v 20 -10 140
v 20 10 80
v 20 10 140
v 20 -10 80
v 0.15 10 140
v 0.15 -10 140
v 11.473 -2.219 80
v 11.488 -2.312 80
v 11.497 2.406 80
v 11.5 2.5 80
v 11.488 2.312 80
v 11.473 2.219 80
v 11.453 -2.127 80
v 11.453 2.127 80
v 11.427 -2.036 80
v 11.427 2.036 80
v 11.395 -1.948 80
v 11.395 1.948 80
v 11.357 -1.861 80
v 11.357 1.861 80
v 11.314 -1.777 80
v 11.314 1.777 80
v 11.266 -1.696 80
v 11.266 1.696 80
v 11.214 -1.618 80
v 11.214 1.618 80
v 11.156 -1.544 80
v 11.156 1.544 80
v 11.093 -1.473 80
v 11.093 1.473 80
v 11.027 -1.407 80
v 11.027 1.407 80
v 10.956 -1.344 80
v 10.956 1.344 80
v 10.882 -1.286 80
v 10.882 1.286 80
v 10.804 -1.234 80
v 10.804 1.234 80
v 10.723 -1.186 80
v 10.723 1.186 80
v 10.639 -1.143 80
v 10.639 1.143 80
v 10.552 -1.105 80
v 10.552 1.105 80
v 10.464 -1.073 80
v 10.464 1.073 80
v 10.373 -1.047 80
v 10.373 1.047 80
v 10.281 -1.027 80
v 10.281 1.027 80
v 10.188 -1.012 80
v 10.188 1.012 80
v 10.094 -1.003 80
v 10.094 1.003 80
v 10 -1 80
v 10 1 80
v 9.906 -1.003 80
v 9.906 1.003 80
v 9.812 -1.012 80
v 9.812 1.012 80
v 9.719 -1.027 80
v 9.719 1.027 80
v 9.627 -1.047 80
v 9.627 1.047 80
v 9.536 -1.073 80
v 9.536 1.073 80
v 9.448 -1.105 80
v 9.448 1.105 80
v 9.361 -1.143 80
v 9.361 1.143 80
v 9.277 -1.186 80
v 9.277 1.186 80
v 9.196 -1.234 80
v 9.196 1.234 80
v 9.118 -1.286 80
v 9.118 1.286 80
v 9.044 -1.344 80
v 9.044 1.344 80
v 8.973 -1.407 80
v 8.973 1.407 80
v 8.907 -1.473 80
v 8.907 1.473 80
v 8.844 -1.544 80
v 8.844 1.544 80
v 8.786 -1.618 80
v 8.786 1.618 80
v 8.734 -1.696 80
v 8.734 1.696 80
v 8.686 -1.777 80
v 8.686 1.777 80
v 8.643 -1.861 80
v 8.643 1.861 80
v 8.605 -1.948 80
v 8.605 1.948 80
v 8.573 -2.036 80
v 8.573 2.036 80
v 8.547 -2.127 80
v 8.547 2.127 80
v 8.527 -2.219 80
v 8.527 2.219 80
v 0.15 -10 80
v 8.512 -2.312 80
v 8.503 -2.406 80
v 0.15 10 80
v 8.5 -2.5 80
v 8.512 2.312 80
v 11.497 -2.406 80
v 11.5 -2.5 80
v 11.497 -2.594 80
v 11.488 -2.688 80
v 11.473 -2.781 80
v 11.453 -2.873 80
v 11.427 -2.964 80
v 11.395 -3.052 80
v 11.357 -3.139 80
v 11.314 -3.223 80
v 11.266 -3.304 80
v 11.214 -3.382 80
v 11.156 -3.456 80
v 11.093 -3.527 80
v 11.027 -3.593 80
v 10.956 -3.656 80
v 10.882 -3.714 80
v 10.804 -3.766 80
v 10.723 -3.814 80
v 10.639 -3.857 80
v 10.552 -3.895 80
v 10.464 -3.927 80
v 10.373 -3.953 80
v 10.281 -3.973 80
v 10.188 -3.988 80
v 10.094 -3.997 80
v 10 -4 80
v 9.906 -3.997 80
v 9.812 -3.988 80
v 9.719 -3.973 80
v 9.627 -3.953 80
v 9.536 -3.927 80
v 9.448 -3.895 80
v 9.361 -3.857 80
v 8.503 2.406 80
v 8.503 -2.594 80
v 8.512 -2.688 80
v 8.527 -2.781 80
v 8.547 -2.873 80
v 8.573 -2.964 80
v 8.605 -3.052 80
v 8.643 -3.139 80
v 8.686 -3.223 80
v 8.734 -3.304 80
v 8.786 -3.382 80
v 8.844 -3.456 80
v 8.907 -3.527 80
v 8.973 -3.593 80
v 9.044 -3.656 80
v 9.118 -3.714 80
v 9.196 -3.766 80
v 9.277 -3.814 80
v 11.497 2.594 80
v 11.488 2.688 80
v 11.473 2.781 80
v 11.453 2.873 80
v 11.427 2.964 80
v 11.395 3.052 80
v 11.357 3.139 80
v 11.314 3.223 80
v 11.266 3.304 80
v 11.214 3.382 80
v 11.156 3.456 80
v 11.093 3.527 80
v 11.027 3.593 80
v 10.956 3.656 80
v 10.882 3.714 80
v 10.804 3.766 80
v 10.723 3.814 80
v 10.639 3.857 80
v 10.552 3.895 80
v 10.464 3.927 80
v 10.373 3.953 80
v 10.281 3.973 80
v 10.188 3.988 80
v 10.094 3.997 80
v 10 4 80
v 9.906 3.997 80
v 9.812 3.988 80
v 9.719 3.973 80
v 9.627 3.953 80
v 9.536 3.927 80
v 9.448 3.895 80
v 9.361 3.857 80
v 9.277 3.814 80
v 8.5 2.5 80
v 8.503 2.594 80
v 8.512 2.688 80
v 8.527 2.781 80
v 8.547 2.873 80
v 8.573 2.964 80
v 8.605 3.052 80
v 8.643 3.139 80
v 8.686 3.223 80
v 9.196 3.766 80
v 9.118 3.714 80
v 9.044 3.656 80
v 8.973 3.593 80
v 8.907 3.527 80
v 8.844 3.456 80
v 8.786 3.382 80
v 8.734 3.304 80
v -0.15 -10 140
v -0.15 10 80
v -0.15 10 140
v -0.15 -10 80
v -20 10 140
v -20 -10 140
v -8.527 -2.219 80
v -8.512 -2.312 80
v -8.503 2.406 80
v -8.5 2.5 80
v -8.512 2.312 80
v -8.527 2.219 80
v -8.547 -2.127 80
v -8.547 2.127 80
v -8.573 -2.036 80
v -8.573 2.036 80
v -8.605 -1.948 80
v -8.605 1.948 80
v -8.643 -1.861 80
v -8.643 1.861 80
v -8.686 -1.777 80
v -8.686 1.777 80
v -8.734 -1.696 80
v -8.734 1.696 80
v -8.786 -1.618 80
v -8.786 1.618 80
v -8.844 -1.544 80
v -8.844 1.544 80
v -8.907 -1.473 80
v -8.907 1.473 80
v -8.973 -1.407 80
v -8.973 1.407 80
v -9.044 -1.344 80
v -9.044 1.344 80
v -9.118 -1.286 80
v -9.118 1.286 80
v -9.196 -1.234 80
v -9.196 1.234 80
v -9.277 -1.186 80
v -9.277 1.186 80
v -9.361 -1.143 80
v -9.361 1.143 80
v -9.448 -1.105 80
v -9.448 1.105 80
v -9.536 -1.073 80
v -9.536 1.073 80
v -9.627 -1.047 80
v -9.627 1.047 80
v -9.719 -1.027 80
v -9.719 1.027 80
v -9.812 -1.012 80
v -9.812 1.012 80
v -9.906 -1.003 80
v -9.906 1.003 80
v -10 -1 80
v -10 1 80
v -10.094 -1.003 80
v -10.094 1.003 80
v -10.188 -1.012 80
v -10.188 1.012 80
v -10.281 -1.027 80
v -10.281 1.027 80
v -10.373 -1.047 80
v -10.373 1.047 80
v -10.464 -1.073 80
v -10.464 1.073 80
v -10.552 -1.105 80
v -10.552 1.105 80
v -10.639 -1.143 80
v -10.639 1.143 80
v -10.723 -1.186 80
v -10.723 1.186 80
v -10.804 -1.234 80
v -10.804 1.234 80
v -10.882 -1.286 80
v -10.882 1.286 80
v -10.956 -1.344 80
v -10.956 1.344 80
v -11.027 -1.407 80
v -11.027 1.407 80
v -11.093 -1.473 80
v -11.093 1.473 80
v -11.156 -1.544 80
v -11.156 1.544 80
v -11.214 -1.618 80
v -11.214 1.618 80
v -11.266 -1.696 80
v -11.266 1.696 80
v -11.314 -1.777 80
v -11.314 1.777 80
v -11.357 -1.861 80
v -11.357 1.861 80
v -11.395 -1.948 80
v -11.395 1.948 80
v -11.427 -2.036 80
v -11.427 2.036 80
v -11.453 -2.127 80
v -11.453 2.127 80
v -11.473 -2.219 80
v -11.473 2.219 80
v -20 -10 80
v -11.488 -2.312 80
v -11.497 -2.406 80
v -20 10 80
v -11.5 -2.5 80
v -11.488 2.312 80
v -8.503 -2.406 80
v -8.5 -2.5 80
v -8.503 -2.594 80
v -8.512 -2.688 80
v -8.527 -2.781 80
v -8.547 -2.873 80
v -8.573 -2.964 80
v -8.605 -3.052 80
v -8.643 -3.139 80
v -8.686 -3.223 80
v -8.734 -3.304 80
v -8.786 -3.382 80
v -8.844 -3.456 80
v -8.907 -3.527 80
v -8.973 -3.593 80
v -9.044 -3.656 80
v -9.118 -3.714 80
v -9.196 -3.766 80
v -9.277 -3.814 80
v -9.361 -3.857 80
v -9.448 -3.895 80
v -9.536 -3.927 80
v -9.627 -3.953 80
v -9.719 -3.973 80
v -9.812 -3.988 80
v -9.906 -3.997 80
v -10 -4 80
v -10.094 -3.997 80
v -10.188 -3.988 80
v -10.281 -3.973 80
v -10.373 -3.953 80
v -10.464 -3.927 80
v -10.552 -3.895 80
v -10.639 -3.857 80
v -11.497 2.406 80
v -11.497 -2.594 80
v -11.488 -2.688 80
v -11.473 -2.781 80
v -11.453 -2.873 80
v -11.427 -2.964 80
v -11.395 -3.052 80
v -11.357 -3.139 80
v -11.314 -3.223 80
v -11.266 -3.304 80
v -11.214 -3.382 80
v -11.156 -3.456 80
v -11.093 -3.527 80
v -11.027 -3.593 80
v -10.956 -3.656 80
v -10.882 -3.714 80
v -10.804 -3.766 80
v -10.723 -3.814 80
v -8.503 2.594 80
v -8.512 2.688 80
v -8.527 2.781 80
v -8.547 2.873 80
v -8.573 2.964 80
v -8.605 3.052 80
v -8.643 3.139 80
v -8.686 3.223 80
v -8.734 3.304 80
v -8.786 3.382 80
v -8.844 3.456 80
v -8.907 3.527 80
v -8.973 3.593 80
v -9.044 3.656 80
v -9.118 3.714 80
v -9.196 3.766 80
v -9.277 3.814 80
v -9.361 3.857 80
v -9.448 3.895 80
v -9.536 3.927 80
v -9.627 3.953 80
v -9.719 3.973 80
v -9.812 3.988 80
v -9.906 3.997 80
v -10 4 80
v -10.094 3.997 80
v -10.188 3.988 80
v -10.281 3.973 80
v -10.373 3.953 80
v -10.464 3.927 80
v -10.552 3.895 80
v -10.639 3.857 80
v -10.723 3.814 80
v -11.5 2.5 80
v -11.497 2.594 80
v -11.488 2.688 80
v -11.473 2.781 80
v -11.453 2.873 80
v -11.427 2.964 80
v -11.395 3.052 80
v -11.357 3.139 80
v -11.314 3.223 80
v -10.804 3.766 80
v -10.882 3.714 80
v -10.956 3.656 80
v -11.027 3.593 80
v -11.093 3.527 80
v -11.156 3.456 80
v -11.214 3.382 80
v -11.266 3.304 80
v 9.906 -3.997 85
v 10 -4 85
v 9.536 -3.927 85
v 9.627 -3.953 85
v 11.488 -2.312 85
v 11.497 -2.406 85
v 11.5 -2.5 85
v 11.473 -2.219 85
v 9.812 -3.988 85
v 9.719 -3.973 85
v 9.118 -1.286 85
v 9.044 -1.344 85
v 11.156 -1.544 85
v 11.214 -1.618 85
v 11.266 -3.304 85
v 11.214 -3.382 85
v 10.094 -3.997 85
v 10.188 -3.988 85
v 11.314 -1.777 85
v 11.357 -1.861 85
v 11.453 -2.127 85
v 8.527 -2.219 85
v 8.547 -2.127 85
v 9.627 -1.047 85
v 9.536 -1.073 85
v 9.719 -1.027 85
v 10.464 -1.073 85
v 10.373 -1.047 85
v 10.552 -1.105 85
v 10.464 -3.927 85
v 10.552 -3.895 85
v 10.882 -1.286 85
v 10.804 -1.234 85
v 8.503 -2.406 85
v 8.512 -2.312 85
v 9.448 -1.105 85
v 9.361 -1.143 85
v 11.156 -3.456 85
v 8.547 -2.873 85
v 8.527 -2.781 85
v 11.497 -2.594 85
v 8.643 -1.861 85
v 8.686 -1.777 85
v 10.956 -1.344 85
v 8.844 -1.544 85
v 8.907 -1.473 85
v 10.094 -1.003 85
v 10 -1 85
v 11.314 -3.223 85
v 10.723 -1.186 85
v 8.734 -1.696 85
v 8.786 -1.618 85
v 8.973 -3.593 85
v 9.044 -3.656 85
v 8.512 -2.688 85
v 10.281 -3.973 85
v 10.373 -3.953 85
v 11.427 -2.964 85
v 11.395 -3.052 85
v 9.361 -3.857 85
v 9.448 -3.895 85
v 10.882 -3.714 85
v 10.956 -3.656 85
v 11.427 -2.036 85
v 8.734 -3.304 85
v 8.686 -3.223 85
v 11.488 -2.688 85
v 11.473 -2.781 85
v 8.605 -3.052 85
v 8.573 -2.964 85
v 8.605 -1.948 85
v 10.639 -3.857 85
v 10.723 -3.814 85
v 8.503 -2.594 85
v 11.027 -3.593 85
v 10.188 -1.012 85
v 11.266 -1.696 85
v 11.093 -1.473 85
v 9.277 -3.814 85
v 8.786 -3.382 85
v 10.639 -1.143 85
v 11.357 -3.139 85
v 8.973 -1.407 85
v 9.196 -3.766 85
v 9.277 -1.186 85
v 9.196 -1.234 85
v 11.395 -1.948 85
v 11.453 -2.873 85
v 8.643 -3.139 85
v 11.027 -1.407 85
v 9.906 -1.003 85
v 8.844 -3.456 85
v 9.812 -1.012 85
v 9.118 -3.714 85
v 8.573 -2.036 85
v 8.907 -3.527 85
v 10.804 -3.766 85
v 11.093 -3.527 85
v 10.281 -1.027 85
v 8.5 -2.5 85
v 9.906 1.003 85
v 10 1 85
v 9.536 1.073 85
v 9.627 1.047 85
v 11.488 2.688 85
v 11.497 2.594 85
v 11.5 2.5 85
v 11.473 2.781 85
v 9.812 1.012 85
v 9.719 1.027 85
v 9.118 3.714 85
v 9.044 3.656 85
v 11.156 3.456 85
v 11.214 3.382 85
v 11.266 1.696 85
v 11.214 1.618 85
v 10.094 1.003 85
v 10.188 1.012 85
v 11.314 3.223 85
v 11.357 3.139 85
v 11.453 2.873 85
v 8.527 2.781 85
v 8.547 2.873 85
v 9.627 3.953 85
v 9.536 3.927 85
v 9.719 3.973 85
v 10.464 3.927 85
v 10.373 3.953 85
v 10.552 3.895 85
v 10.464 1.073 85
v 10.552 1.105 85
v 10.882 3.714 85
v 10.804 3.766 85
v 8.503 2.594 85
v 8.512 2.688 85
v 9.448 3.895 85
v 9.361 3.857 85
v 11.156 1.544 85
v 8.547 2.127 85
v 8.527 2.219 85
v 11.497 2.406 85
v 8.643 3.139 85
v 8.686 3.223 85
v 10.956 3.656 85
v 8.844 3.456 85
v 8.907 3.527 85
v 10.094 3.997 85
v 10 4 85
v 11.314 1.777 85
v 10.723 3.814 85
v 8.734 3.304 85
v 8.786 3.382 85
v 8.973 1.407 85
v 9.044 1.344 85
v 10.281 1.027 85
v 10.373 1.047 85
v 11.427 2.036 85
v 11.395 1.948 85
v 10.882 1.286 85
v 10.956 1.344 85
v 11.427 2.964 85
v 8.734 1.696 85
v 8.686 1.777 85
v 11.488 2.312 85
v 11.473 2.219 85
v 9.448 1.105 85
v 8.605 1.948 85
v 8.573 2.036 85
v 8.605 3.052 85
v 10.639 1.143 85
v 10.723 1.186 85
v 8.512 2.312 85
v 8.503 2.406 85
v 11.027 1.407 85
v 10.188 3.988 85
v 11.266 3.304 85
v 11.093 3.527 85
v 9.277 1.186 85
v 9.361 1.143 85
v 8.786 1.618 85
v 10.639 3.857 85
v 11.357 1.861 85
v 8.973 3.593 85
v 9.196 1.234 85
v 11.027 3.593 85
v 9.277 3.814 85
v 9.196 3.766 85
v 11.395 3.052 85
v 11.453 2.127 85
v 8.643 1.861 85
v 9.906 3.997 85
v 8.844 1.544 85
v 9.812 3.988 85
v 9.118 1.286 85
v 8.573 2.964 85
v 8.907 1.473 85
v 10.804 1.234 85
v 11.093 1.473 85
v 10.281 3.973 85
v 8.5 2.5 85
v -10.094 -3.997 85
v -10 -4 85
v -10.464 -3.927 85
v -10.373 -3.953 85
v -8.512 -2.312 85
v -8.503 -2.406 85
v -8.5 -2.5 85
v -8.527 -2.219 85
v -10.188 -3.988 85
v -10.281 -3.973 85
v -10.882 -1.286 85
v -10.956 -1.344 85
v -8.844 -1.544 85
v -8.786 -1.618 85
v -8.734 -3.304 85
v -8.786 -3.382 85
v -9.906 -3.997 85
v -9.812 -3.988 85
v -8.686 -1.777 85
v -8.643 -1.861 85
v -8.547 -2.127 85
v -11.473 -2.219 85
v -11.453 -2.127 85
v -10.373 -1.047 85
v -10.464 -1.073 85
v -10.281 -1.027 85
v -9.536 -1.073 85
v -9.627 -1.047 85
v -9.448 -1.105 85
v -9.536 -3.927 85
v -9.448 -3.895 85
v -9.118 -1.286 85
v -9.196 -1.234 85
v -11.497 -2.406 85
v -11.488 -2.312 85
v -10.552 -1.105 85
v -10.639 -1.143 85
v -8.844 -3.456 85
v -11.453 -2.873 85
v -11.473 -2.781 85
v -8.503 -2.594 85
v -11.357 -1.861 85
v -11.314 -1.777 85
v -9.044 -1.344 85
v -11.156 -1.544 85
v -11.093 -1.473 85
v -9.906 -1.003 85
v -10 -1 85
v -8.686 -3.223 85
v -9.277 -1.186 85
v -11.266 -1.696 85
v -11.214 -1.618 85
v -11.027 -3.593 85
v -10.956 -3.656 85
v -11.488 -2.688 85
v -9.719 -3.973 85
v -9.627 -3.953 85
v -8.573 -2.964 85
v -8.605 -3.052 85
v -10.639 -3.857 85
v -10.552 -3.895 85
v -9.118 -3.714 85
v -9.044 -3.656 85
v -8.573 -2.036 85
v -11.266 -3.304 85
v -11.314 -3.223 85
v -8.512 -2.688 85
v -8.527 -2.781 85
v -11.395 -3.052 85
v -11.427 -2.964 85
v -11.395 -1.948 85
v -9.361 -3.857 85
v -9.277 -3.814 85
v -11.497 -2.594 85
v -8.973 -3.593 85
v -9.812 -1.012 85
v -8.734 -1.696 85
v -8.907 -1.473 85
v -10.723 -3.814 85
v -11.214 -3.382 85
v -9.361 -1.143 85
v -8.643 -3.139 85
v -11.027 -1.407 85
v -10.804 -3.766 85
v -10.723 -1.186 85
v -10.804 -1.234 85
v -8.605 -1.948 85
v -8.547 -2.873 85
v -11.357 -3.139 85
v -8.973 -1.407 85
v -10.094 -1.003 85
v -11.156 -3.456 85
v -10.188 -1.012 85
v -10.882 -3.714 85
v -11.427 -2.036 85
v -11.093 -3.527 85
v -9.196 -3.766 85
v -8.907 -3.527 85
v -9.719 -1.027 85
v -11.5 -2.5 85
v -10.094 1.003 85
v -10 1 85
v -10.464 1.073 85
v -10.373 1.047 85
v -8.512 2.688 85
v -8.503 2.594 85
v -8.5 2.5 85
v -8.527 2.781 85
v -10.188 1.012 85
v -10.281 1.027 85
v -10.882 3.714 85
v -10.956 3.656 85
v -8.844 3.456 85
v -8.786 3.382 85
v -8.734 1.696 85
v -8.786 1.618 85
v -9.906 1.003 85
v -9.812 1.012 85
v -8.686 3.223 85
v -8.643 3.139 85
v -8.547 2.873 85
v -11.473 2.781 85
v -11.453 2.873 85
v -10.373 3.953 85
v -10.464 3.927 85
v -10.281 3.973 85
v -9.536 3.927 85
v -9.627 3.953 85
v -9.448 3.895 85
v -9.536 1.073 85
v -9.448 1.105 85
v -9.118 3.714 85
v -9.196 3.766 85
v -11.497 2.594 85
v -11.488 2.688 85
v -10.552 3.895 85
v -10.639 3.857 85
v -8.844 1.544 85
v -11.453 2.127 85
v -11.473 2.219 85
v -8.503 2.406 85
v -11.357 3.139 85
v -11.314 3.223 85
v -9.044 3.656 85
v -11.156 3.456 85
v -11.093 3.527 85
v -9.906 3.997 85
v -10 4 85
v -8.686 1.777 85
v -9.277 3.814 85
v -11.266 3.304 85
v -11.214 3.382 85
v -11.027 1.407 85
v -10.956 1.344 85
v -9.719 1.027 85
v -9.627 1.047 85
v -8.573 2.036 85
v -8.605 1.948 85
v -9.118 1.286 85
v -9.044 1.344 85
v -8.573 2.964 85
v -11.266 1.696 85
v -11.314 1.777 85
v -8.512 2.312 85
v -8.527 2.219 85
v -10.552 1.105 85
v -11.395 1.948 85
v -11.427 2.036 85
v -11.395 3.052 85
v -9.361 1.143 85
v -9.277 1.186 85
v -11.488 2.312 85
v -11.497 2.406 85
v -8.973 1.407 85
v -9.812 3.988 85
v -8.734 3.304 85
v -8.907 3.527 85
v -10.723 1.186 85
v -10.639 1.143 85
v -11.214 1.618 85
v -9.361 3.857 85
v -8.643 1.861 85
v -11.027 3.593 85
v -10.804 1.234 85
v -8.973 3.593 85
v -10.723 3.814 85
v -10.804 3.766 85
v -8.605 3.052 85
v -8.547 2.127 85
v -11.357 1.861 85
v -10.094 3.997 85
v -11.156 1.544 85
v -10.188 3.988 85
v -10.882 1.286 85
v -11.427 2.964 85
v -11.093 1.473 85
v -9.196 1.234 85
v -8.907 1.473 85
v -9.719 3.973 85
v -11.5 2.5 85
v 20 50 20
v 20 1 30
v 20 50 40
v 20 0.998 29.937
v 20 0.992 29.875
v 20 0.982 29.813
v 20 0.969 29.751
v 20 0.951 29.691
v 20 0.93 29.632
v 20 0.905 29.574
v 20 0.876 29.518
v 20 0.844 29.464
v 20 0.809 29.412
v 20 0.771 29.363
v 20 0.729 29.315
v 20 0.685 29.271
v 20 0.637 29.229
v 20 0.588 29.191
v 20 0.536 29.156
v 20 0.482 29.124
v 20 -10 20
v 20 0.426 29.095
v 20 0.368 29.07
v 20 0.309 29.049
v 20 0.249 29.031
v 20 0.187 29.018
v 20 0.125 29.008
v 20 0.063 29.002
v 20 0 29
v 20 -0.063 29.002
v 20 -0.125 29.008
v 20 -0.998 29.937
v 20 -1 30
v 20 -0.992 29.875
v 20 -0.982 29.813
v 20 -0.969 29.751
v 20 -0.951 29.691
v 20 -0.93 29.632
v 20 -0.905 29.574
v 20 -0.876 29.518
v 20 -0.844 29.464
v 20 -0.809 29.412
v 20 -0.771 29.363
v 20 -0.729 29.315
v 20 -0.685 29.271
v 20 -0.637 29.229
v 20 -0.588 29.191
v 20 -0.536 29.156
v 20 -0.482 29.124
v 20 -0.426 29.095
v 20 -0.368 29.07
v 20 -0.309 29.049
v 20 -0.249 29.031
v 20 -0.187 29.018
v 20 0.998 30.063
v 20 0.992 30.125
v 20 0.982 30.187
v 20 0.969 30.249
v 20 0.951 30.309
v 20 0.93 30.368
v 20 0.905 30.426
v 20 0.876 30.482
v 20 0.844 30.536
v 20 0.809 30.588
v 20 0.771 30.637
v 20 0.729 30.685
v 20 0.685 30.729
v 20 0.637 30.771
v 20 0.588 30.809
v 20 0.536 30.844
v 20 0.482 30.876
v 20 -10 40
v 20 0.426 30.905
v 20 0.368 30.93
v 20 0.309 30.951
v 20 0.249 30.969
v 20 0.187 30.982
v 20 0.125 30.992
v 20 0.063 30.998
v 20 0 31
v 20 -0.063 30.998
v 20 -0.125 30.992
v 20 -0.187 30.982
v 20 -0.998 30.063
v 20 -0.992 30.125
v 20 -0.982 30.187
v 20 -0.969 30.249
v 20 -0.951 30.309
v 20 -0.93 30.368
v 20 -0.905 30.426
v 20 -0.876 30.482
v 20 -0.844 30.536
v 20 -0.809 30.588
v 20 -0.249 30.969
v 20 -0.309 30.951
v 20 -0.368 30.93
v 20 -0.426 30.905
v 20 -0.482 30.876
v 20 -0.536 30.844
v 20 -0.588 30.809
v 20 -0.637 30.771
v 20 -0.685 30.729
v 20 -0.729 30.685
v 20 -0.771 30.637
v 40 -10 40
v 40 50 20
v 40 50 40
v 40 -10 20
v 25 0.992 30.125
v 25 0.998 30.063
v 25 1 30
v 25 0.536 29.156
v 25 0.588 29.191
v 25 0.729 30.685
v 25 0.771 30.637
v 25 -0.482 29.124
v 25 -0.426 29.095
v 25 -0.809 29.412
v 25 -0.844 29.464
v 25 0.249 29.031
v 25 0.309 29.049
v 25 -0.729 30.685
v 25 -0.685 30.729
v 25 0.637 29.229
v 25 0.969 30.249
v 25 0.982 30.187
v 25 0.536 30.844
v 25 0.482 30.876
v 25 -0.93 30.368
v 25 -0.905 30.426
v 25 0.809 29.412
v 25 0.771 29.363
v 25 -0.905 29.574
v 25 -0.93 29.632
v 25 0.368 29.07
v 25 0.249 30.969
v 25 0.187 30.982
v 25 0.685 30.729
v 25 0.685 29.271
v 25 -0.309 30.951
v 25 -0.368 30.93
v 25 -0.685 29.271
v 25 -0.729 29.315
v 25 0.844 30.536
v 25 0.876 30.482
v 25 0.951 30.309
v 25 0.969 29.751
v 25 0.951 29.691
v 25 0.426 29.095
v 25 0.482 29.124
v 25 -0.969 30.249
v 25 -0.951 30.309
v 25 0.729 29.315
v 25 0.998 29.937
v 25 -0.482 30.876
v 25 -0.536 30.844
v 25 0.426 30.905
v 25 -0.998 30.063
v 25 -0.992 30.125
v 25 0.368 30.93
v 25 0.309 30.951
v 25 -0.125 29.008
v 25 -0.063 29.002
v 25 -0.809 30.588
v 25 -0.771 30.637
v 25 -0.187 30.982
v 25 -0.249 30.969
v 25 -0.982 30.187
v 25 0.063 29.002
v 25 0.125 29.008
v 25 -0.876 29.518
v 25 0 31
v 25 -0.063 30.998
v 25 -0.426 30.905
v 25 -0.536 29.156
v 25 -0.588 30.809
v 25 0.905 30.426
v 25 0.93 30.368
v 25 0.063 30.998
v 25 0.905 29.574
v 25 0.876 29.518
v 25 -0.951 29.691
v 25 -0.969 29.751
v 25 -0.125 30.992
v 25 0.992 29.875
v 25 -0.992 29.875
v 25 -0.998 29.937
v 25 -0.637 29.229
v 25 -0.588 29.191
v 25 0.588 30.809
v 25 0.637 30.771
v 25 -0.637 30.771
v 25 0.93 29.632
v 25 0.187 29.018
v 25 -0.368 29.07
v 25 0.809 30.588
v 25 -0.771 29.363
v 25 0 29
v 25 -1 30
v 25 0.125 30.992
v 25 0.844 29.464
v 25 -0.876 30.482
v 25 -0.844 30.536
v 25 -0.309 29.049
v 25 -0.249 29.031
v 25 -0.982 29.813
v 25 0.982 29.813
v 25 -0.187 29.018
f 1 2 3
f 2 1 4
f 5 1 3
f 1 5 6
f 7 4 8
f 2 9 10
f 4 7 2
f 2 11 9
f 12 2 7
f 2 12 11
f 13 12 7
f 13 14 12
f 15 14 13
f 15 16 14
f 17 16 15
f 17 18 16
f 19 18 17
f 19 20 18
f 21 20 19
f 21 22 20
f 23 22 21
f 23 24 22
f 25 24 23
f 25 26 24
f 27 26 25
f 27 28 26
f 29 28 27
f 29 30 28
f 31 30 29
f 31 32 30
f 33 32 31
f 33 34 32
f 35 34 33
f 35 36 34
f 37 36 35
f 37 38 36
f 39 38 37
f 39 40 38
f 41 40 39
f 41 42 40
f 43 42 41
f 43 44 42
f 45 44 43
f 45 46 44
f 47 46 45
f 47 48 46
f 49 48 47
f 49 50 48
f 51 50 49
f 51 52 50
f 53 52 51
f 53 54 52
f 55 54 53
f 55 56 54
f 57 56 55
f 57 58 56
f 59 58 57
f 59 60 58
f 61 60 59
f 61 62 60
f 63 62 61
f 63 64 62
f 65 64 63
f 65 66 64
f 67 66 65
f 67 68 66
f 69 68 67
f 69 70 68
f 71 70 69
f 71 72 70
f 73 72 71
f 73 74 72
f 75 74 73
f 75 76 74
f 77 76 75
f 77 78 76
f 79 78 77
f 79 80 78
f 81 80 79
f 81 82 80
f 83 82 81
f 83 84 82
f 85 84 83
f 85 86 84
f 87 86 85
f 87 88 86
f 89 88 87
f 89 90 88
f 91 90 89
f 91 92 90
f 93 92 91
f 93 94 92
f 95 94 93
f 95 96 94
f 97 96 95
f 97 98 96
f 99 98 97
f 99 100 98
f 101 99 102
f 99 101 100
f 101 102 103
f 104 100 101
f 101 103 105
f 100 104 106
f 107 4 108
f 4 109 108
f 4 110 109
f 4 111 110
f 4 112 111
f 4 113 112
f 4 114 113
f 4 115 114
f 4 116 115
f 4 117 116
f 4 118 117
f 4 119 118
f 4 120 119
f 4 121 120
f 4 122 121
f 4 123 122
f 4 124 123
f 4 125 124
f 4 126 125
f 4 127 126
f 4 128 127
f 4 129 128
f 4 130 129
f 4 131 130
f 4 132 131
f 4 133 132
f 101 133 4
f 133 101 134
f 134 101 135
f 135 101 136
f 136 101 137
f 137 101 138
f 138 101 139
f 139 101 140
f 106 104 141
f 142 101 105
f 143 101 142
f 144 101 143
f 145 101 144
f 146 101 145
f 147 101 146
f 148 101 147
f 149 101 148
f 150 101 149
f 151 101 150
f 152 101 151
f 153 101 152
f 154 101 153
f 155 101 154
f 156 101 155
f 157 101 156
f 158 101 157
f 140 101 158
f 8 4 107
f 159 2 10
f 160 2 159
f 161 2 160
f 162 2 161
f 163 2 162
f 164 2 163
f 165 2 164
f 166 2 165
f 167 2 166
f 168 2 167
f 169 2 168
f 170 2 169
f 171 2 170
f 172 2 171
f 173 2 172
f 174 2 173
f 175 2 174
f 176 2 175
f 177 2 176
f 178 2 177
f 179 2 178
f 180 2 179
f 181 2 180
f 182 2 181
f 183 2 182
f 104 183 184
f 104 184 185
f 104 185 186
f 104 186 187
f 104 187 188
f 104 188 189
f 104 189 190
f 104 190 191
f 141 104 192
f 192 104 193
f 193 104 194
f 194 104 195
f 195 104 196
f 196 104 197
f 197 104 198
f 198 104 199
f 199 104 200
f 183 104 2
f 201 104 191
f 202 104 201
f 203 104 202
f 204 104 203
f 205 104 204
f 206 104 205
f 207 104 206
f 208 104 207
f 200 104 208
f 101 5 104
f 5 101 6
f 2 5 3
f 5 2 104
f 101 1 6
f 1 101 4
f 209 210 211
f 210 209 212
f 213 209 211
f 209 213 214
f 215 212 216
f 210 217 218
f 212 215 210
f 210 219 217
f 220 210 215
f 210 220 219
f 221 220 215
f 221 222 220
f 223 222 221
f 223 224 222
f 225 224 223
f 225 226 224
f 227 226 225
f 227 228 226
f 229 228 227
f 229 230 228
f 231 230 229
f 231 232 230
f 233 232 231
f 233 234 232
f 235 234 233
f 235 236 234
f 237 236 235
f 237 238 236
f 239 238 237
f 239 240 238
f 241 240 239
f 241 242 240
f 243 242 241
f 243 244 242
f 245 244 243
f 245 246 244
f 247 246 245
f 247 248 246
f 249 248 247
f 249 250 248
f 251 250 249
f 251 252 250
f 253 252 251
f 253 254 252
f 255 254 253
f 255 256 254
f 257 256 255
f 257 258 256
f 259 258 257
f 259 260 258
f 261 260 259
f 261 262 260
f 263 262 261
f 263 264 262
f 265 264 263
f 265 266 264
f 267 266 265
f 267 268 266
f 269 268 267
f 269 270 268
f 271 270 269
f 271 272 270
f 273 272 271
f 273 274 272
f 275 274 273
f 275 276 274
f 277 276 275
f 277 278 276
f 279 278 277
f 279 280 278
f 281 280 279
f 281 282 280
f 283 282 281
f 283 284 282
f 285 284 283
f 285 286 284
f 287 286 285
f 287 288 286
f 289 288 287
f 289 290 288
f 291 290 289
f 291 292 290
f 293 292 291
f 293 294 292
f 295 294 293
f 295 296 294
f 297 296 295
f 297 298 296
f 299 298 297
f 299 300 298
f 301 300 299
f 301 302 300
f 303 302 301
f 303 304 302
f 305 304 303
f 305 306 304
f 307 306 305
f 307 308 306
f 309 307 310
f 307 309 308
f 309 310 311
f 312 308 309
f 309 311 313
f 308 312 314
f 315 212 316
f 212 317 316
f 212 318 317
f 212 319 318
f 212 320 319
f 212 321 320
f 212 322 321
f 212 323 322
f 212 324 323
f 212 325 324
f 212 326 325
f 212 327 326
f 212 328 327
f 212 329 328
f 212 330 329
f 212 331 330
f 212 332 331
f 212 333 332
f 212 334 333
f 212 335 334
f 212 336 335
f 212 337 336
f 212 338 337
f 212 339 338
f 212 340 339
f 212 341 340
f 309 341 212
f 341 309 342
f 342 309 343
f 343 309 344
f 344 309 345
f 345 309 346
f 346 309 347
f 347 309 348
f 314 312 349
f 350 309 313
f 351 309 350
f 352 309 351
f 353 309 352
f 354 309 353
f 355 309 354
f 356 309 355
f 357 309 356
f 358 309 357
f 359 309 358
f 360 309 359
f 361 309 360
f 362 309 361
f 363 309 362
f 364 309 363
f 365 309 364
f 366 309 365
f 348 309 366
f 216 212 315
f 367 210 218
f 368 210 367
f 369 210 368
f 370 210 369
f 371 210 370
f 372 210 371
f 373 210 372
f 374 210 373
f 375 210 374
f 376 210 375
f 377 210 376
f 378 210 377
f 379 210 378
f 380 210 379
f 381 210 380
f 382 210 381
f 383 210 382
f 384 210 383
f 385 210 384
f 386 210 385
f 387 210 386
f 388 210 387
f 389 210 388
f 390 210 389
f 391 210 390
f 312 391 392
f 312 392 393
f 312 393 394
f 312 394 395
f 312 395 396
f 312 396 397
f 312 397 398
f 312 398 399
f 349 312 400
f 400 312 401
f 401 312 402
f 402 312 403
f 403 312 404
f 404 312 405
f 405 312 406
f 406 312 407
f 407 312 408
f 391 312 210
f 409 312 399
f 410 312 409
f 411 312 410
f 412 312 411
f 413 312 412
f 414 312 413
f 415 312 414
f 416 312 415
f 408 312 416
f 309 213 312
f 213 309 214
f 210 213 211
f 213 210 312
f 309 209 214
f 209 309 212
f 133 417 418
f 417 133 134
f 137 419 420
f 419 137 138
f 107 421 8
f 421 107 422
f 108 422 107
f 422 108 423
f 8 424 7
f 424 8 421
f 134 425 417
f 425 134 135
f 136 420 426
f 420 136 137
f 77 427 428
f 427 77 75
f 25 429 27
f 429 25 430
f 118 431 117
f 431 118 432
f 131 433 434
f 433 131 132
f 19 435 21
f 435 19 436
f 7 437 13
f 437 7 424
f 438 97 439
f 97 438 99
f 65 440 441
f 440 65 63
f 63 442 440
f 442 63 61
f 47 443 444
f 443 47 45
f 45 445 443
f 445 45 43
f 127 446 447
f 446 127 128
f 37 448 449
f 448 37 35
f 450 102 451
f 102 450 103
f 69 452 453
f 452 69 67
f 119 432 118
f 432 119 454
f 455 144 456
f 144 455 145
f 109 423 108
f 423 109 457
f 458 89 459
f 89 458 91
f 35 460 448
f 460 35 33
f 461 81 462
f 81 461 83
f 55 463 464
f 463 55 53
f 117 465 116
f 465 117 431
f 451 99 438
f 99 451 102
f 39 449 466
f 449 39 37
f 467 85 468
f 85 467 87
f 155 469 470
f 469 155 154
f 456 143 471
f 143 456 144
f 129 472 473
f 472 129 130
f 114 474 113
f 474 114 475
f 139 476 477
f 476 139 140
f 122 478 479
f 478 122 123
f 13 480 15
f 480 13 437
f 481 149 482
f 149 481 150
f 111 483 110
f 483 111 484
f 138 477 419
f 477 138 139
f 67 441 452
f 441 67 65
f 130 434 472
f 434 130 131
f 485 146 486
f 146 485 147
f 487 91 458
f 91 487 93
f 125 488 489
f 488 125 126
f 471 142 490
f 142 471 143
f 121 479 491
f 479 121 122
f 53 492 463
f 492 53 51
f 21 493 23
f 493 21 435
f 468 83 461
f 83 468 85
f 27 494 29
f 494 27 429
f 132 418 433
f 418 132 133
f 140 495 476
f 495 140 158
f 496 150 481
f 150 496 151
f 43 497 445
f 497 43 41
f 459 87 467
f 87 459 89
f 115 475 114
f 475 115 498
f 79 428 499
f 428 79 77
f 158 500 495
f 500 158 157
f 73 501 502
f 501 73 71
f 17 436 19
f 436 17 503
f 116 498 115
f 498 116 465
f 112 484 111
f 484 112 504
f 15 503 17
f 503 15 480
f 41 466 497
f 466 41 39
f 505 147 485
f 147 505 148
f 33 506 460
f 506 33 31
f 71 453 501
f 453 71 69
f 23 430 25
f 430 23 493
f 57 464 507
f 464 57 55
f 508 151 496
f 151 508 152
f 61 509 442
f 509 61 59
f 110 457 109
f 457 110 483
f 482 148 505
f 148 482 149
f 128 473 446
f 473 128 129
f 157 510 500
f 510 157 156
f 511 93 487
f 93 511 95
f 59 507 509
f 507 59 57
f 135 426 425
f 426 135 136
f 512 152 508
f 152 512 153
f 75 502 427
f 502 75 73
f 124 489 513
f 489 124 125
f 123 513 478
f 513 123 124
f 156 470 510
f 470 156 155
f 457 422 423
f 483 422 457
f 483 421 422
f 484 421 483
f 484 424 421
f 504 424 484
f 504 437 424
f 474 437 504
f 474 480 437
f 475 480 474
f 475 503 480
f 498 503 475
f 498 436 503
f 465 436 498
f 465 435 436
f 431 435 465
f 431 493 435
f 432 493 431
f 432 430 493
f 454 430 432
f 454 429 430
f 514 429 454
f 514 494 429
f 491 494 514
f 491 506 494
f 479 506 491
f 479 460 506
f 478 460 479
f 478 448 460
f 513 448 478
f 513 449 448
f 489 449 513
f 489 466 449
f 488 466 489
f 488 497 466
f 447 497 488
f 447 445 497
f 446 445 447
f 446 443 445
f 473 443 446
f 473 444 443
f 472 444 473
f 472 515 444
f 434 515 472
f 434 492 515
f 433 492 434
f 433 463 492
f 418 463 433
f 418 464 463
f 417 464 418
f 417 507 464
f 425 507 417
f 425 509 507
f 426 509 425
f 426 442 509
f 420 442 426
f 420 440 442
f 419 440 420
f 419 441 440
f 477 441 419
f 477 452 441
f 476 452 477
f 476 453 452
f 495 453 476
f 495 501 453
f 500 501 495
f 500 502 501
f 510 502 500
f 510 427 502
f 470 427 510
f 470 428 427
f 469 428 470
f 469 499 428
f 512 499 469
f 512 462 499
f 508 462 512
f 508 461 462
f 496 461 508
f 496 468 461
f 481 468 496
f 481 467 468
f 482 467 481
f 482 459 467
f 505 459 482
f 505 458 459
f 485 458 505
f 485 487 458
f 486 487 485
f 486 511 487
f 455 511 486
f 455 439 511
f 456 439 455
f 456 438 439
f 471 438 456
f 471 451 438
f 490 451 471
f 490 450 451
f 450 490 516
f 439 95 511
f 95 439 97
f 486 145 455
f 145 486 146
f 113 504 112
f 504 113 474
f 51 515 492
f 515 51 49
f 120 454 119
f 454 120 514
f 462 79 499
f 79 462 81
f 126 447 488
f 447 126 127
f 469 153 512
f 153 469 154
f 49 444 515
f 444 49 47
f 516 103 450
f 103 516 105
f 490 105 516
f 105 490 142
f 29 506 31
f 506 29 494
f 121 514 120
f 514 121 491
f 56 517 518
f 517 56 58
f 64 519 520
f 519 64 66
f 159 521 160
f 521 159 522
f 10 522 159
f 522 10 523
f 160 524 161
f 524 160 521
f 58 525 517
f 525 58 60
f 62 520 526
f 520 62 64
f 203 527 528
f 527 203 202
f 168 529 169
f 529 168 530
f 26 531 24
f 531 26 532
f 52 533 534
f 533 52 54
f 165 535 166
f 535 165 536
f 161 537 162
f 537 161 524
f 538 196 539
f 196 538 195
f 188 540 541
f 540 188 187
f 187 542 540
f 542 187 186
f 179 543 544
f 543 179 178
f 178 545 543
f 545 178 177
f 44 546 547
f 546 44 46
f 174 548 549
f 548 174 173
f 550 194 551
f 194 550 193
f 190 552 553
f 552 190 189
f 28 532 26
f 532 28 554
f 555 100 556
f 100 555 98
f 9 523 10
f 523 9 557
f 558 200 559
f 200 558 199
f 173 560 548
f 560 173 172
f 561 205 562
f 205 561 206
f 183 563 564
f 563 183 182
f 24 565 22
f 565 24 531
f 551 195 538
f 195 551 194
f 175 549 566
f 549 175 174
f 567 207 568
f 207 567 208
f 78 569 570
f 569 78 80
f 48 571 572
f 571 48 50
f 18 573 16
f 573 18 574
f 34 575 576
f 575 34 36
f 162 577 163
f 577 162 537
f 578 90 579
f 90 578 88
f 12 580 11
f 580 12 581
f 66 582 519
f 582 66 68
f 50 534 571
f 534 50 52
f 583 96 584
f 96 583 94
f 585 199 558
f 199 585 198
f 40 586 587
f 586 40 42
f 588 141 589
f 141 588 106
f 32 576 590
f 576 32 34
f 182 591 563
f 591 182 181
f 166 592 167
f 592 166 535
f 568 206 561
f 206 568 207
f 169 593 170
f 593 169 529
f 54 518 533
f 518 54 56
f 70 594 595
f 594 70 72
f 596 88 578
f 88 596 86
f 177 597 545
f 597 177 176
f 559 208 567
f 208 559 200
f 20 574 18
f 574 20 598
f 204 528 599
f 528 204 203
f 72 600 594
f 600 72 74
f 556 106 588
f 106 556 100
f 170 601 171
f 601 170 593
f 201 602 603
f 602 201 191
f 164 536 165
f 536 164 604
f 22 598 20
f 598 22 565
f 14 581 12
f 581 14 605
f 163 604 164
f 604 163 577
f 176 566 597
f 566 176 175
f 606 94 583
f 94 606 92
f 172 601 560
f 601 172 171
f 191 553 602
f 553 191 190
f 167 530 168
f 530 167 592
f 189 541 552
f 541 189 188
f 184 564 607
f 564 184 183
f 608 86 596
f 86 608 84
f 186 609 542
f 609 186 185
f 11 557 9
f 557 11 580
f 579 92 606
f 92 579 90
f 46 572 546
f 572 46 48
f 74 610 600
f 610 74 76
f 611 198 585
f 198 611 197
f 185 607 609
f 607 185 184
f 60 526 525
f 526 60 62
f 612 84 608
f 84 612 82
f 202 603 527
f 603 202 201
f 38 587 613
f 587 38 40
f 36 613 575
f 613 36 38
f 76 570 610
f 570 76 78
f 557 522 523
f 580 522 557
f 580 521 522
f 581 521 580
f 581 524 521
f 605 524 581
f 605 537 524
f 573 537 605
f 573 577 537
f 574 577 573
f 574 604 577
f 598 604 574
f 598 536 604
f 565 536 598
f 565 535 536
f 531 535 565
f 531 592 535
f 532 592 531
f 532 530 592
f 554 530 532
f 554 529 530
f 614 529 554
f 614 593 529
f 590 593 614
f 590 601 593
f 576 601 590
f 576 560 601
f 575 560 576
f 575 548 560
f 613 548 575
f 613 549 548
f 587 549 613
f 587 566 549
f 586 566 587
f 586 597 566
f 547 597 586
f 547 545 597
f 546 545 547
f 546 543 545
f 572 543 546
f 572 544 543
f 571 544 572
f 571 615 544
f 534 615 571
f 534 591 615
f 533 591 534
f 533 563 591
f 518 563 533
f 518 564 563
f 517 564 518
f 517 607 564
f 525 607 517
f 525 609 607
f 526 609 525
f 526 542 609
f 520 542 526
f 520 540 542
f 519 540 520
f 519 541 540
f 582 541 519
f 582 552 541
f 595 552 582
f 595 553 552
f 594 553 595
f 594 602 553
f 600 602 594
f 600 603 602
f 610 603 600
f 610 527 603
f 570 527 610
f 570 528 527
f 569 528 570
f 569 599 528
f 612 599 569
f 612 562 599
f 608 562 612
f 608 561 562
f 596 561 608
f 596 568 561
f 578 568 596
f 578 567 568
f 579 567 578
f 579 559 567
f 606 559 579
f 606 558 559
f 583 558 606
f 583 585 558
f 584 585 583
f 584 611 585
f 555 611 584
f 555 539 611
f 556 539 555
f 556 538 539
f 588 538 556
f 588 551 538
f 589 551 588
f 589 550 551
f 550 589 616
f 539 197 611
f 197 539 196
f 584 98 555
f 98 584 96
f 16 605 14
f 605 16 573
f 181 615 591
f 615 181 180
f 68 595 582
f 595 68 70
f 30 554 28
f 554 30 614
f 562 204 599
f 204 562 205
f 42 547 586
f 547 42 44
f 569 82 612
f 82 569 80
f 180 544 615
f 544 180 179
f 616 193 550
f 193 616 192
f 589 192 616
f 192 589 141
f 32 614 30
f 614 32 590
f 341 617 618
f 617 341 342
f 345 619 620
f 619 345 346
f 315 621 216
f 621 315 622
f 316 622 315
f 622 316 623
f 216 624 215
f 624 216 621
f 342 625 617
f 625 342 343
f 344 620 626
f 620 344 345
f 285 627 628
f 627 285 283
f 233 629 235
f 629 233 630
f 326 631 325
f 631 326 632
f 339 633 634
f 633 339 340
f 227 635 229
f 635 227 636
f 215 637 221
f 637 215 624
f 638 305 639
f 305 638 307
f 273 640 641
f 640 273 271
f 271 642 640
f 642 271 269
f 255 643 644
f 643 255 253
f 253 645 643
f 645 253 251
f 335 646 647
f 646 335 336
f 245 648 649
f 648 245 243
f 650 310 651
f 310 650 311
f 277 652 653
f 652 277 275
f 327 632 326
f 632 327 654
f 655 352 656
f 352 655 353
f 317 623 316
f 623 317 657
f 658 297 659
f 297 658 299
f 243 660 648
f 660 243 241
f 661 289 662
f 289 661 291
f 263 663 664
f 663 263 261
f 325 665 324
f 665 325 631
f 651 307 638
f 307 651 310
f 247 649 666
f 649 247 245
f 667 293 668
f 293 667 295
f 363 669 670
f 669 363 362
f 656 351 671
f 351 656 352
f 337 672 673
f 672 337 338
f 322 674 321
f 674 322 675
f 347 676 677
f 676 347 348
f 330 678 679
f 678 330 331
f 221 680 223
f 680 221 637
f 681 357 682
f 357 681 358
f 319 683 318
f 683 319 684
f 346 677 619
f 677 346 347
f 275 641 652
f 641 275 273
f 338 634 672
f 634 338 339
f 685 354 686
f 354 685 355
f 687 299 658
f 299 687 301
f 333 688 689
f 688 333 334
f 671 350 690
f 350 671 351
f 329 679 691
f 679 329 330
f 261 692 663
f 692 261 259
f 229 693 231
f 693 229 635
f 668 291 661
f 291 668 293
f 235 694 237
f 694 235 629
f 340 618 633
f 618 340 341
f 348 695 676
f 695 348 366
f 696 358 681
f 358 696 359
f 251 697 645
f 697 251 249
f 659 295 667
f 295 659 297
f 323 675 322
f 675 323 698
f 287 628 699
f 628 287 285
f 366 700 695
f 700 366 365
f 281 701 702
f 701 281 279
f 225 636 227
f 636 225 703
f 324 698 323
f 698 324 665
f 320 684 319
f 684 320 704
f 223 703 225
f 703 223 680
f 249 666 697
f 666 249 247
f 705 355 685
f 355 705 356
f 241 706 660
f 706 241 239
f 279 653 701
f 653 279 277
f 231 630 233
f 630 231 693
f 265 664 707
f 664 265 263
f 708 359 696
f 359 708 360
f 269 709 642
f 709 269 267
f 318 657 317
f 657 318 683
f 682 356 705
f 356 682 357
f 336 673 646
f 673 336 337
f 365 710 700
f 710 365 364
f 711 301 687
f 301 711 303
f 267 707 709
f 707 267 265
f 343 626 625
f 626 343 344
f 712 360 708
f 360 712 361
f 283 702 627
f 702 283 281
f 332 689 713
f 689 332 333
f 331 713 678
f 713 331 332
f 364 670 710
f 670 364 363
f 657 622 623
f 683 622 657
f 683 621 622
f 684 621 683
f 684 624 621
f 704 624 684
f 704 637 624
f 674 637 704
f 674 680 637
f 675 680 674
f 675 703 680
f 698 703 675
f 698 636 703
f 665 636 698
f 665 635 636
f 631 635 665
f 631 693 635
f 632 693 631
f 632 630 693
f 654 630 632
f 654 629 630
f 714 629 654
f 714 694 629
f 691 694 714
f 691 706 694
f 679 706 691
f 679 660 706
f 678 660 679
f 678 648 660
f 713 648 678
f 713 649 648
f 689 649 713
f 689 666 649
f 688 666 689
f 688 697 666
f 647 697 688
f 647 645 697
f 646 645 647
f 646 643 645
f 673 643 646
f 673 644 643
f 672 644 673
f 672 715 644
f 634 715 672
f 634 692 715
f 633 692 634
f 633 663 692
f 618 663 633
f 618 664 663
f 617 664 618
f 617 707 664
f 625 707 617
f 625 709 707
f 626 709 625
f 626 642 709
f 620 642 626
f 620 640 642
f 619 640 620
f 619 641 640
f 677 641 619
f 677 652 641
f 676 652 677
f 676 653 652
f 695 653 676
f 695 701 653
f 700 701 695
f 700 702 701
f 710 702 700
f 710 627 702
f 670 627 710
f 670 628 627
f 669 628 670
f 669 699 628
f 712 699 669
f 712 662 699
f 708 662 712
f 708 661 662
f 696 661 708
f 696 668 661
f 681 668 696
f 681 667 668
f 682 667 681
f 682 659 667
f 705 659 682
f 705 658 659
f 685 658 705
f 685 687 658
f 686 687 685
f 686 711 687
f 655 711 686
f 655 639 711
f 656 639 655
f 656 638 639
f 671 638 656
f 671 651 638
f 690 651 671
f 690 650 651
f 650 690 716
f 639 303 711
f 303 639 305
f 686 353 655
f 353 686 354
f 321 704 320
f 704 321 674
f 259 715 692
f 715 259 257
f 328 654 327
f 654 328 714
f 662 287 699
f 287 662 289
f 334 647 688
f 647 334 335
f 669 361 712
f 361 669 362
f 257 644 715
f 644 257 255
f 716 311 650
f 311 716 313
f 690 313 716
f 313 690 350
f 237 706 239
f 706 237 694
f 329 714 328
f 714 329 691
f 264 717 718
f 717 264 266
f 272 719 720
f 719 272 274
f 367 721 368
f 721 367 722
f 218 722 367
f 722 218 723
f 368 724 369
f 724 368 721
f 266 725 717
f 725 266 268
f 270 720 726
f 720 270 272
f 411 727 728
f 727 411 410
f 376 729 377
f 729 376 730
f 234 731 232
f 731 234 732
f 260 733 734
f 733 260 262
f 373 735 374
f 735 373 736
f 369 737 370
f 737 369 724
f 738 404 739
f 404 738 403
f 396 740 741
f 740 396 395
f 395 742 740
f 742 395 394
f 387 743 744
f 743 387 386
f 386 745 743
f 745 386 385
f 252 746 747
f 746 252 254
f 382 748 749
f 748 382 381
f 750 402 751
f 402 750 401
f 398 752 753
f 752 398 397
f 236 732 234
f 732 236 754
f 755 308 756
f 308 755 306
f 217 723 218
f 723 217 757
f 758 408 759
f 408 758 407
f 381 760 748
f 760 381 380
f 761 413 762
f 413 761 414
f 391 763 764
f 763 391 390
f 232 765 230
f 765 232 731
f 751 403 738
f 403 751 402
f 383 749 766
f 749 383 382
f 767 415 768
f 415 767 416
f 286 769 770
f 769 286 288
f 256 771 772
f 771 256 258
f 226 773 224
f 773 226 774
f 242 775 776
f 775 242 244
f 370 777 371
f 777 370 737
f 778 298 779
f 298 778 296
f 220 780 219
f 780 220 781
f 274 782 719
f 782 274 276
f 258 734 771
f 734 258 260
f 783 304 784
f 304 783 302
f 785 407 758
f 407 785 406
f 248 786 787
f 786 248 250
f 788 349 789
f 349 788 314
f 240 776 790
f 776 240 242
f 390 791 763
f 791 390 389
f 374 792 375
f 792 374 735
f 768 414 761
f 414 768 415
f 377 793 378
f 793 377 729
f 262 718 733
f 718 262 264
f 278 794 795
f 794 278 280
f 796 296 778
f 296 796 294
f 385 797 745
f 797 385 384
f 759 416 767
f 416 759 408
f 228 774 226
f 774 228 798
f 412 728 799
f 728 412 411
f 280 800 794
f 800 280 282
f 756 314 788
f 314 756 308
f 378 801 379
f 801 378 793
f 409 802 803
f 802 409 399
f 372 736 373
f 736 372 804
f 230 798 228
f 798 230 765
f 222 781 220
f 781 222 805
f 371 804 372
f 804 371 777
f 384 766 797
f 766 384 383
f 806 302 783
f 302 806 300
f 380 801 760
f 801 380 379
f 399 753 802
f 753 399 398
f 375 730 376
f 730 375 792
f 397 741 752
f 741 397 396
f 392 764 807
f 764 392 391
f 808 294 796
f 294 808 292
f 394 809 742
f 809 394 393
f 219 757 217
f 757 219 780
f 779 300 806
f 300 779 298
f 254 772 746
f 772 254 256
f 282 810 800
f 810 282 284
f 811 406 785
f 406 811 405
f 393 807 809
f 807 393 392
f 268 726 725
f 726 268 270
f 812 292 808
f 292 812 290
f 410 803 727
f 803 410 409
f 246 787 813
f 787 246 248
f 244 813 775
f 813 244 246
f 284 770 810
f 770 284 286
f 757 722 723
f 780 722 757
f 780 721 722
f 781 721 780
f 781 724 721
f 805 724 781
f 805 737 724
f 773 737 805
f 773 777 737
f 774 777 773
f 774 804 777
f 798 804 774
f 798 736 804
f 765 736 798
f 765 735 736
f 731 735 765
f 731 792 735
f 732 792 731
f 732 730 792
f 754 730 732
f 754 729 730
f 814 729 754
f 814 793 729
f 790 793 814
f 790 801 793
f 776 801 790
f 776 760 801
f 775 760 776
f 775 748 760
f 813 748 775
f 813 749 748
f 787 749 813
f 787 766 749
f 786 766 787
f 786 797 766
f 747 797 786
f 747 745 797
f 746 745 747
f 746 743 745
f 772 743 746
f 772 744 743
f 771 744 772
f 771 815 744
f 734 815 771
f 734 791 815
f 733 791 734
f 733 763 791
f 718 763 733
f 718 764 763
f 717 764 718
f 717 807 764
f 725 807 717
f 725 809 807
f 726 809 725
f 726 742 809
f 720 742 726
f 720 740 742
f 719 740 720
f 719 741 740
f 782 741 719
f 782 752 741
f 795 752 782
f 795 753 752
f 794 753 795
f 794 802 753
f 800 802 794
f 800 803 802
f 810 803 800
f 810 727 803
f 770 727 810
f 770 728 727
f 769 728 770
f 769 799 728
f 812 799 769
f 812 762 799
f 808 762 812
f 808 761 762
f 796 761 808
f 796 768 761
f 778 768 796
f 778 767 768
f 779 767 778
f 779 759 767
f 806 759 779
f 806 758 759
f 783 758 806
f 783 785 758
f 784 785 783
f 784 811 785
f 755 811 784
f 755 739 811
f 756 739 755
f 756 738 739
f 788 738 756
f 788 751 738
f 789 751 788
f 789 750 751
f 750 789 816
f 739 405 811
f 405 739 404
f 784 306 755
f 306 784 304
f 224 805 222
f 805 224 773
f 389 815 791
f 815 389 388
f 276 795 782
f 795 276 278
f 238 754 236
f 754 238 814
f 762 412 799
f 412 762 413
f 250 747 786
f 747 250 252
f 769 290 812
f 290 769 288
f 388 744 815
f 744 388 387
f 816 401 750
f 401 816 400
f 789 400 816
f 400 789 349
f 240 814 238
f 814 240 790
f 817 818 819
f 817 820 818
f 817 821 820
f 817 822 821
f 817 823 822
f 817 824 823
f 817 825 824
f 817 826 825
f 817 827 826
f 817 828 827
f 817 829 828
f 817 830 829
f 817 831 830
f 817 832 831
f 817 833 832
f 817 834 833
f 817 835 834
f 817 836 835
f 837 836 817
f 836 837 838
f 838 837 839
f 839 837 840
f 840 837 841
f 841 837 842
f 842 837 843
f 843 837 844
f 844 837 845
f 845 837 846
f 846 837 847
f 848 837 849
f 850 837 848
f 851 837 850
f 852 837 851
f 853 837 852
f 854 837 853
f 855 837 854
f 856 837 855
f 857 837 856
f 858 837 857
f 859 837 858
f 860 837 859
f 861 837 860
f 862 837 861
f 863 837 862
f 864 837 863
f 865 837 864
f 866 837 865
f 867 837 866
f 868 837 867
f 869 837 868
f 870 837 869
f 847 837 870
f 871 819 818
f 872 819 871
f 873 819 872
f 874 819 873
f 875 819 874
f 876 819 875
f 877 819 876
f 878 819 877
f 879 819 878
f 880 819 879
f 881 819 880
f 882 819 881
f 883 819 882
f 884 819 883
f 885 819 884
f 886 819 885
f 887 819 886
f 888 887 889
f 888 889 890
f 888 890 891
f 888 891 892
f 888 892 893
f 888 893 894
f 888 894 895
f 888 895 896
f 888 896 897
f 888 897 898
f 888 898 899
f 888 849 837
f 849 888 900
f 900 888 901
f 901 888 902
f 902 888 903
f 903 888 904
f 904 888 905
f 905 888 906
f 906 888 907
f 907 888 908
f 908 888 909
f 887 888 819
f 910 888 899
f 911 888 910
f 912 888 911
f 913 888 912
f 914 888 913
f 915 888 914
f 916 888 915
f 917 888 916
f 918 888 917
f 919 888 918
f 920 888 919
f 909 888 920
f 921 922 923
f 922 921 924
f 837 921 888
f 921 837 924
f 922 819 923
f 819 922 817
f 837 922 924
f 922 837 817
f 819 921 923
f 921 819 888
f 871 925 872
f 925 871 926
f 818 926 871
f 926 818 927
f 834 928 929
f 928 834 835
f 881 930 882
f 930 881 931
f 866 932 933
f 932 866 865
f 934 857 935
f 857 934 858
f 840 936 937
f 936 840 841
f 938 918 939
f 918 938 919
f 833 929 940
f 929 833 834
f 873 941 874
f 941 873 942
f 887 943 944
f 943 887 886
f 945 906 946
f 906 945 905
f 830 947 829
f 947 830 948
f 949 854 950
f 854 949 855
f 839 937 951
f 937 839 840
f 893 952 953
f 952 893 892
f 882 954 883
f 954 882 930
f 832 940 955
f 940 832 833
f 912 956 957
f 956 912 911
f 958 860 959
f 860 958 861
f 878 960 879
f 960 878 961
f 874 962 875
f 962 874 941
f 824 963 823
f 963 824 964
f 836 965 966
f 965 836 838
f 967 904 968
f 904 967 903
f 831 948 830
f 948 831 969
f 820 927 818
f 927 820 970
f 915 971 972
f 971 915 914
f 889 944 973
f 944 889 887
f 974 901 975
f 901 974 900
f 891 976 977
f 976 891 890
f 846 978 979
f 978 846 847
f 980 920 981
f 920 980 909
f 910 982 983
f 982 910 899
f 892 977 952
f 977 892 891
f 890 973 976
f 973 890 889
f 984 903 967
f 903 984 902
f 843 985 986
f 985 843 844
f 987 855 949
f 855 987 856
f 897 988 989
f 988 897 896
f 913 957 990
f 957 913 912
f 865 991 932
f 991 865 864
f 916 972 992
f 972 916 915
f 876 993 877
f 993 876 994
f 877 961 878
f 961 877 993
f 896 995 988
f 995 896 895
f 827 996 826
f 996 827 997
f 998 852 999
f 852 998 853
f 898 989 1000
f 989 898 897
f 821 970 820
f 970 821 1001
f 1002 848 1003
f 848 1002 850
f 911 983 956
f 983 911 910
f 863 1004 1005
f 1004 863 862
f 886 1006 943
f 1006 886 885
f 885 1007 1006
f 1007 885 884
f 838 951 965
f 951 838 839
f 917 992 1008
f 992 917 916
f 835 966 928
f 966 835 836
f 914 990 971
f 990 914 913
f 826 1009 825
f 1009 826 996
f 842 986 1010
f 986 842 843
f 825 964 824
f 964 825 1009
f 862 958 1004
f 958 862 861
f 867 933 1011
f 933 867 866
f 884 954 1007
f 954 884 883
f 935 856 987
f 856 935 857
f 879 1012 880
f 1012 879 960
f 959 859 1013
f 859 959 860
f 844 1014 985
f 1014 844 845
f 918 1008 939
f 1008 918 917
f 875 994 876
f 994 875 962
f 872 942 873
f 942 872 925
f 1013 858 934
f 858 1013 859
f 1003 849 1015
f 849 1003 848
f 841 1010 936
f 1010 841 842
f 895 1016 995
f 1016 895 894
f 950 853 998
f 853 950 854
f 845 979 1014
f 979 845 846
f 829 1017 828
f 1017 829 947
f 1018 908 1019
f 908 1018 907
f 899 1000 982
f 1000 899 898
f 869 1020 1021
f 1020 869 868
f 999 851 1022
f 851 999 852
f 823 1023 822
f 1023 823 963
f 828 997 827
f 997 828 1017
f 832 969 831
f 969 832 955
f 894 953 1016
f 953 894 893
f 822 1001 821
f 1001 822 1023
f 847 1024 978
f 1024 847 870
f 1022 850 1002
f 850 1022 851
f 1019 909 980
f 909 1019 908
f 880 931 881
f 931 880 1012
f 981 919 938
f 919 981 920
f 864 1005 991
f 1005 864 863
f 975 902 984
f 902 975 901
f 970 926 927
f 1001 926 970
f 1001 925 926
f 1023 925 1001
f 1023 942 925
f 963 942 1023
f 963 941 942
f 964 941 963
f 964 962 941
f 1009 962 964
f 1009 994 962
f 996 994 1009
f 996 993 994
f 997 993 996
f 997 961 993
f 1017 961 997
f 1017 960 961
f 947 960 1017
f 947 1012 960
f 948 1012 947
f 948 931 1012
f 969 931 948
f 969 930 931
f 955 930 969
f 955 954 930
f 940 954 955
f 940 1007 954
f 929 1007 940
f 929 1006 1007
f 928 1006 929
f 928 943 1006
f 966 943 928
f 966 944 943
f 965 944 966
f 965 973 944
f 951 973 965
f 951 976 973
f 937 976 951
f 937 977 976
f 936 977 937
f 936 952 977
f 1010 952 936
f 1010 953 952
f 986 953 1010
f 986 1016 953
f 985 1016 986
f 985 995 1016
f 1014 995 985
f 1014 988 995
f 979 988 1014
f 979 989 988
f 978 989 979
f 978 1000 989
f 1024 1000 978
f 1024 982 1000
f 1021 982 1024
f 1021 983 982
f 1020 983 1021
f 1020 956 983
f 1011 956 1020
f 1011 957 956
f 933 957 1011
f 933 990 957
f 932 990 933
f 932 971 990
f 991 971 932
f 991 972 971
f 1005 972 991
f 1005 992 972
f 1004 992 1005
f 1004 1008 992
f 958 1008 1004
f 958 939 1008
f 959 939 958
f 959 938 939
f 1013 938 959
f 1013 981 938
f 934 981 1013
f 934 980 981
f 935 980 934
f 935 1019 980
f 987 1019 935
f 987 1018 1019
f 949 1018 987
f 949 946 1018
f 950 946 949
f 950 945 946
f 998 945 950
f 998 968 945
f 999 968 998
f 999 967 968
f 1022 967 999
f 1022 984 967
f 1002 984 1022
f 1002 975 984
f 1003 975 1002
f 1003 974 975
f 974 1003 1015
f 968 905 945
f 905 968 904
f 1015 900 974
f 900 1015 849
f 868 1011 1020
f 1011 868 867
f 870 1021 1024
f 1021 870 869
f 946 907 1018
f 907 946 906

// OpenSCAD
//Declare the scale that will be used for the model. This scale is used to calculate the pixel to mm scale. EX. scale of 5 means 1pixel on skin = 5mm. 

scale=5;

//Create the head of guy

module head() 
{
difference() 
{
cube(size = scale * 8, center=true);
translate([0,0,scale*4])cylinder(r=scale*1,h=8, center=true,$fn=100);
}
}

//create the connector hole for use to connect the leg to body with a piece of filament 

module leg_connector()
{
translate([scale*2,scale*1,0])cylinder(r=1.5,h=scale*2, center=true,$fn=100); 
translate([scale*2,scale*2,0])cylinder(r=1.5,h=scale*2, center=true,$fn=100);
}

//Create the body of guy

module body() 
{
difference()
{
union()
{
translate([0,0,scale*10])cube([scale*8,scale*4,scale*12], center=true);
translate([0,0,scale*4])cylinder(r=scale*1-0.25,h=8, center=true,$fn=100);
}
translate([0,scale*-1.5,scale*16])leg_connector();
translate([scale*-4,scale*-1.5,scale*16])leg_connector();
translate([scale*4,0,scale*6])rotate(a=[90,0,90])cylinder(r=1.5,h=scale*2, center=true,$fn=100);
translate([scale*-4,0,scale*6])rotate(a=[90,0,90])cylinder(r=1.5,h=scale*2, center=true,$fn=100);
}
}

//Create the legs of the guy

module legs()
{
difference()
{
union()
{
translate([scale*2.015,0,scale*22])cube([scale*3.97,scale*4,scale*12], center=true);
translate([scale*-2.015,0,scale*22])cube([scale*3.97,scale*4,scale*12], center=true);
}
translate([0,scale*-1.5,scale*16])leg_connector();
translate([scale*-4,scale*-1.5,scale*16])leg_connector();
}
}

//Create the tools arm of guy

module toolarm()
{
difference()
{
translate([-6*scale,4*scale,6*scale])rotate([90,0,0])cube([4*scale,4*scale,12*scale],center=true);
translate([-6*scale,8.5*scale,6*scale])rotate([0,90,0])cube([5*scale+0.5,1.4*scale+0.5,1*scale+0.5],center=true);
translate([scale*-4,0,scale*6])rotate(a=[90,0,90])cylinder(r=scale*0.2,h=scale*2, center=true,$fn=100);
}
}

//Create the normal arm of guy

module freearm()
{
difference()
{
translate([6*scale,4*scale,6*scale])rotate([90,0,0])cube([4*scale,4*scale,12*scale],center=true);
translate([scale*4,0,scale*6])rotate(a=[90,0,90])cylinder(r=scale*0.2,h=scale*2, center=true,$fn=100);
}
}

//head();       //Call to generate the guy's head
//body();       //Call to generate the guy's body
legs();         //Call to generate the guy's legs
//toolarm();   //Call to generate the guy's tool arm
freearm();  //Call to generate the guy's free arm
